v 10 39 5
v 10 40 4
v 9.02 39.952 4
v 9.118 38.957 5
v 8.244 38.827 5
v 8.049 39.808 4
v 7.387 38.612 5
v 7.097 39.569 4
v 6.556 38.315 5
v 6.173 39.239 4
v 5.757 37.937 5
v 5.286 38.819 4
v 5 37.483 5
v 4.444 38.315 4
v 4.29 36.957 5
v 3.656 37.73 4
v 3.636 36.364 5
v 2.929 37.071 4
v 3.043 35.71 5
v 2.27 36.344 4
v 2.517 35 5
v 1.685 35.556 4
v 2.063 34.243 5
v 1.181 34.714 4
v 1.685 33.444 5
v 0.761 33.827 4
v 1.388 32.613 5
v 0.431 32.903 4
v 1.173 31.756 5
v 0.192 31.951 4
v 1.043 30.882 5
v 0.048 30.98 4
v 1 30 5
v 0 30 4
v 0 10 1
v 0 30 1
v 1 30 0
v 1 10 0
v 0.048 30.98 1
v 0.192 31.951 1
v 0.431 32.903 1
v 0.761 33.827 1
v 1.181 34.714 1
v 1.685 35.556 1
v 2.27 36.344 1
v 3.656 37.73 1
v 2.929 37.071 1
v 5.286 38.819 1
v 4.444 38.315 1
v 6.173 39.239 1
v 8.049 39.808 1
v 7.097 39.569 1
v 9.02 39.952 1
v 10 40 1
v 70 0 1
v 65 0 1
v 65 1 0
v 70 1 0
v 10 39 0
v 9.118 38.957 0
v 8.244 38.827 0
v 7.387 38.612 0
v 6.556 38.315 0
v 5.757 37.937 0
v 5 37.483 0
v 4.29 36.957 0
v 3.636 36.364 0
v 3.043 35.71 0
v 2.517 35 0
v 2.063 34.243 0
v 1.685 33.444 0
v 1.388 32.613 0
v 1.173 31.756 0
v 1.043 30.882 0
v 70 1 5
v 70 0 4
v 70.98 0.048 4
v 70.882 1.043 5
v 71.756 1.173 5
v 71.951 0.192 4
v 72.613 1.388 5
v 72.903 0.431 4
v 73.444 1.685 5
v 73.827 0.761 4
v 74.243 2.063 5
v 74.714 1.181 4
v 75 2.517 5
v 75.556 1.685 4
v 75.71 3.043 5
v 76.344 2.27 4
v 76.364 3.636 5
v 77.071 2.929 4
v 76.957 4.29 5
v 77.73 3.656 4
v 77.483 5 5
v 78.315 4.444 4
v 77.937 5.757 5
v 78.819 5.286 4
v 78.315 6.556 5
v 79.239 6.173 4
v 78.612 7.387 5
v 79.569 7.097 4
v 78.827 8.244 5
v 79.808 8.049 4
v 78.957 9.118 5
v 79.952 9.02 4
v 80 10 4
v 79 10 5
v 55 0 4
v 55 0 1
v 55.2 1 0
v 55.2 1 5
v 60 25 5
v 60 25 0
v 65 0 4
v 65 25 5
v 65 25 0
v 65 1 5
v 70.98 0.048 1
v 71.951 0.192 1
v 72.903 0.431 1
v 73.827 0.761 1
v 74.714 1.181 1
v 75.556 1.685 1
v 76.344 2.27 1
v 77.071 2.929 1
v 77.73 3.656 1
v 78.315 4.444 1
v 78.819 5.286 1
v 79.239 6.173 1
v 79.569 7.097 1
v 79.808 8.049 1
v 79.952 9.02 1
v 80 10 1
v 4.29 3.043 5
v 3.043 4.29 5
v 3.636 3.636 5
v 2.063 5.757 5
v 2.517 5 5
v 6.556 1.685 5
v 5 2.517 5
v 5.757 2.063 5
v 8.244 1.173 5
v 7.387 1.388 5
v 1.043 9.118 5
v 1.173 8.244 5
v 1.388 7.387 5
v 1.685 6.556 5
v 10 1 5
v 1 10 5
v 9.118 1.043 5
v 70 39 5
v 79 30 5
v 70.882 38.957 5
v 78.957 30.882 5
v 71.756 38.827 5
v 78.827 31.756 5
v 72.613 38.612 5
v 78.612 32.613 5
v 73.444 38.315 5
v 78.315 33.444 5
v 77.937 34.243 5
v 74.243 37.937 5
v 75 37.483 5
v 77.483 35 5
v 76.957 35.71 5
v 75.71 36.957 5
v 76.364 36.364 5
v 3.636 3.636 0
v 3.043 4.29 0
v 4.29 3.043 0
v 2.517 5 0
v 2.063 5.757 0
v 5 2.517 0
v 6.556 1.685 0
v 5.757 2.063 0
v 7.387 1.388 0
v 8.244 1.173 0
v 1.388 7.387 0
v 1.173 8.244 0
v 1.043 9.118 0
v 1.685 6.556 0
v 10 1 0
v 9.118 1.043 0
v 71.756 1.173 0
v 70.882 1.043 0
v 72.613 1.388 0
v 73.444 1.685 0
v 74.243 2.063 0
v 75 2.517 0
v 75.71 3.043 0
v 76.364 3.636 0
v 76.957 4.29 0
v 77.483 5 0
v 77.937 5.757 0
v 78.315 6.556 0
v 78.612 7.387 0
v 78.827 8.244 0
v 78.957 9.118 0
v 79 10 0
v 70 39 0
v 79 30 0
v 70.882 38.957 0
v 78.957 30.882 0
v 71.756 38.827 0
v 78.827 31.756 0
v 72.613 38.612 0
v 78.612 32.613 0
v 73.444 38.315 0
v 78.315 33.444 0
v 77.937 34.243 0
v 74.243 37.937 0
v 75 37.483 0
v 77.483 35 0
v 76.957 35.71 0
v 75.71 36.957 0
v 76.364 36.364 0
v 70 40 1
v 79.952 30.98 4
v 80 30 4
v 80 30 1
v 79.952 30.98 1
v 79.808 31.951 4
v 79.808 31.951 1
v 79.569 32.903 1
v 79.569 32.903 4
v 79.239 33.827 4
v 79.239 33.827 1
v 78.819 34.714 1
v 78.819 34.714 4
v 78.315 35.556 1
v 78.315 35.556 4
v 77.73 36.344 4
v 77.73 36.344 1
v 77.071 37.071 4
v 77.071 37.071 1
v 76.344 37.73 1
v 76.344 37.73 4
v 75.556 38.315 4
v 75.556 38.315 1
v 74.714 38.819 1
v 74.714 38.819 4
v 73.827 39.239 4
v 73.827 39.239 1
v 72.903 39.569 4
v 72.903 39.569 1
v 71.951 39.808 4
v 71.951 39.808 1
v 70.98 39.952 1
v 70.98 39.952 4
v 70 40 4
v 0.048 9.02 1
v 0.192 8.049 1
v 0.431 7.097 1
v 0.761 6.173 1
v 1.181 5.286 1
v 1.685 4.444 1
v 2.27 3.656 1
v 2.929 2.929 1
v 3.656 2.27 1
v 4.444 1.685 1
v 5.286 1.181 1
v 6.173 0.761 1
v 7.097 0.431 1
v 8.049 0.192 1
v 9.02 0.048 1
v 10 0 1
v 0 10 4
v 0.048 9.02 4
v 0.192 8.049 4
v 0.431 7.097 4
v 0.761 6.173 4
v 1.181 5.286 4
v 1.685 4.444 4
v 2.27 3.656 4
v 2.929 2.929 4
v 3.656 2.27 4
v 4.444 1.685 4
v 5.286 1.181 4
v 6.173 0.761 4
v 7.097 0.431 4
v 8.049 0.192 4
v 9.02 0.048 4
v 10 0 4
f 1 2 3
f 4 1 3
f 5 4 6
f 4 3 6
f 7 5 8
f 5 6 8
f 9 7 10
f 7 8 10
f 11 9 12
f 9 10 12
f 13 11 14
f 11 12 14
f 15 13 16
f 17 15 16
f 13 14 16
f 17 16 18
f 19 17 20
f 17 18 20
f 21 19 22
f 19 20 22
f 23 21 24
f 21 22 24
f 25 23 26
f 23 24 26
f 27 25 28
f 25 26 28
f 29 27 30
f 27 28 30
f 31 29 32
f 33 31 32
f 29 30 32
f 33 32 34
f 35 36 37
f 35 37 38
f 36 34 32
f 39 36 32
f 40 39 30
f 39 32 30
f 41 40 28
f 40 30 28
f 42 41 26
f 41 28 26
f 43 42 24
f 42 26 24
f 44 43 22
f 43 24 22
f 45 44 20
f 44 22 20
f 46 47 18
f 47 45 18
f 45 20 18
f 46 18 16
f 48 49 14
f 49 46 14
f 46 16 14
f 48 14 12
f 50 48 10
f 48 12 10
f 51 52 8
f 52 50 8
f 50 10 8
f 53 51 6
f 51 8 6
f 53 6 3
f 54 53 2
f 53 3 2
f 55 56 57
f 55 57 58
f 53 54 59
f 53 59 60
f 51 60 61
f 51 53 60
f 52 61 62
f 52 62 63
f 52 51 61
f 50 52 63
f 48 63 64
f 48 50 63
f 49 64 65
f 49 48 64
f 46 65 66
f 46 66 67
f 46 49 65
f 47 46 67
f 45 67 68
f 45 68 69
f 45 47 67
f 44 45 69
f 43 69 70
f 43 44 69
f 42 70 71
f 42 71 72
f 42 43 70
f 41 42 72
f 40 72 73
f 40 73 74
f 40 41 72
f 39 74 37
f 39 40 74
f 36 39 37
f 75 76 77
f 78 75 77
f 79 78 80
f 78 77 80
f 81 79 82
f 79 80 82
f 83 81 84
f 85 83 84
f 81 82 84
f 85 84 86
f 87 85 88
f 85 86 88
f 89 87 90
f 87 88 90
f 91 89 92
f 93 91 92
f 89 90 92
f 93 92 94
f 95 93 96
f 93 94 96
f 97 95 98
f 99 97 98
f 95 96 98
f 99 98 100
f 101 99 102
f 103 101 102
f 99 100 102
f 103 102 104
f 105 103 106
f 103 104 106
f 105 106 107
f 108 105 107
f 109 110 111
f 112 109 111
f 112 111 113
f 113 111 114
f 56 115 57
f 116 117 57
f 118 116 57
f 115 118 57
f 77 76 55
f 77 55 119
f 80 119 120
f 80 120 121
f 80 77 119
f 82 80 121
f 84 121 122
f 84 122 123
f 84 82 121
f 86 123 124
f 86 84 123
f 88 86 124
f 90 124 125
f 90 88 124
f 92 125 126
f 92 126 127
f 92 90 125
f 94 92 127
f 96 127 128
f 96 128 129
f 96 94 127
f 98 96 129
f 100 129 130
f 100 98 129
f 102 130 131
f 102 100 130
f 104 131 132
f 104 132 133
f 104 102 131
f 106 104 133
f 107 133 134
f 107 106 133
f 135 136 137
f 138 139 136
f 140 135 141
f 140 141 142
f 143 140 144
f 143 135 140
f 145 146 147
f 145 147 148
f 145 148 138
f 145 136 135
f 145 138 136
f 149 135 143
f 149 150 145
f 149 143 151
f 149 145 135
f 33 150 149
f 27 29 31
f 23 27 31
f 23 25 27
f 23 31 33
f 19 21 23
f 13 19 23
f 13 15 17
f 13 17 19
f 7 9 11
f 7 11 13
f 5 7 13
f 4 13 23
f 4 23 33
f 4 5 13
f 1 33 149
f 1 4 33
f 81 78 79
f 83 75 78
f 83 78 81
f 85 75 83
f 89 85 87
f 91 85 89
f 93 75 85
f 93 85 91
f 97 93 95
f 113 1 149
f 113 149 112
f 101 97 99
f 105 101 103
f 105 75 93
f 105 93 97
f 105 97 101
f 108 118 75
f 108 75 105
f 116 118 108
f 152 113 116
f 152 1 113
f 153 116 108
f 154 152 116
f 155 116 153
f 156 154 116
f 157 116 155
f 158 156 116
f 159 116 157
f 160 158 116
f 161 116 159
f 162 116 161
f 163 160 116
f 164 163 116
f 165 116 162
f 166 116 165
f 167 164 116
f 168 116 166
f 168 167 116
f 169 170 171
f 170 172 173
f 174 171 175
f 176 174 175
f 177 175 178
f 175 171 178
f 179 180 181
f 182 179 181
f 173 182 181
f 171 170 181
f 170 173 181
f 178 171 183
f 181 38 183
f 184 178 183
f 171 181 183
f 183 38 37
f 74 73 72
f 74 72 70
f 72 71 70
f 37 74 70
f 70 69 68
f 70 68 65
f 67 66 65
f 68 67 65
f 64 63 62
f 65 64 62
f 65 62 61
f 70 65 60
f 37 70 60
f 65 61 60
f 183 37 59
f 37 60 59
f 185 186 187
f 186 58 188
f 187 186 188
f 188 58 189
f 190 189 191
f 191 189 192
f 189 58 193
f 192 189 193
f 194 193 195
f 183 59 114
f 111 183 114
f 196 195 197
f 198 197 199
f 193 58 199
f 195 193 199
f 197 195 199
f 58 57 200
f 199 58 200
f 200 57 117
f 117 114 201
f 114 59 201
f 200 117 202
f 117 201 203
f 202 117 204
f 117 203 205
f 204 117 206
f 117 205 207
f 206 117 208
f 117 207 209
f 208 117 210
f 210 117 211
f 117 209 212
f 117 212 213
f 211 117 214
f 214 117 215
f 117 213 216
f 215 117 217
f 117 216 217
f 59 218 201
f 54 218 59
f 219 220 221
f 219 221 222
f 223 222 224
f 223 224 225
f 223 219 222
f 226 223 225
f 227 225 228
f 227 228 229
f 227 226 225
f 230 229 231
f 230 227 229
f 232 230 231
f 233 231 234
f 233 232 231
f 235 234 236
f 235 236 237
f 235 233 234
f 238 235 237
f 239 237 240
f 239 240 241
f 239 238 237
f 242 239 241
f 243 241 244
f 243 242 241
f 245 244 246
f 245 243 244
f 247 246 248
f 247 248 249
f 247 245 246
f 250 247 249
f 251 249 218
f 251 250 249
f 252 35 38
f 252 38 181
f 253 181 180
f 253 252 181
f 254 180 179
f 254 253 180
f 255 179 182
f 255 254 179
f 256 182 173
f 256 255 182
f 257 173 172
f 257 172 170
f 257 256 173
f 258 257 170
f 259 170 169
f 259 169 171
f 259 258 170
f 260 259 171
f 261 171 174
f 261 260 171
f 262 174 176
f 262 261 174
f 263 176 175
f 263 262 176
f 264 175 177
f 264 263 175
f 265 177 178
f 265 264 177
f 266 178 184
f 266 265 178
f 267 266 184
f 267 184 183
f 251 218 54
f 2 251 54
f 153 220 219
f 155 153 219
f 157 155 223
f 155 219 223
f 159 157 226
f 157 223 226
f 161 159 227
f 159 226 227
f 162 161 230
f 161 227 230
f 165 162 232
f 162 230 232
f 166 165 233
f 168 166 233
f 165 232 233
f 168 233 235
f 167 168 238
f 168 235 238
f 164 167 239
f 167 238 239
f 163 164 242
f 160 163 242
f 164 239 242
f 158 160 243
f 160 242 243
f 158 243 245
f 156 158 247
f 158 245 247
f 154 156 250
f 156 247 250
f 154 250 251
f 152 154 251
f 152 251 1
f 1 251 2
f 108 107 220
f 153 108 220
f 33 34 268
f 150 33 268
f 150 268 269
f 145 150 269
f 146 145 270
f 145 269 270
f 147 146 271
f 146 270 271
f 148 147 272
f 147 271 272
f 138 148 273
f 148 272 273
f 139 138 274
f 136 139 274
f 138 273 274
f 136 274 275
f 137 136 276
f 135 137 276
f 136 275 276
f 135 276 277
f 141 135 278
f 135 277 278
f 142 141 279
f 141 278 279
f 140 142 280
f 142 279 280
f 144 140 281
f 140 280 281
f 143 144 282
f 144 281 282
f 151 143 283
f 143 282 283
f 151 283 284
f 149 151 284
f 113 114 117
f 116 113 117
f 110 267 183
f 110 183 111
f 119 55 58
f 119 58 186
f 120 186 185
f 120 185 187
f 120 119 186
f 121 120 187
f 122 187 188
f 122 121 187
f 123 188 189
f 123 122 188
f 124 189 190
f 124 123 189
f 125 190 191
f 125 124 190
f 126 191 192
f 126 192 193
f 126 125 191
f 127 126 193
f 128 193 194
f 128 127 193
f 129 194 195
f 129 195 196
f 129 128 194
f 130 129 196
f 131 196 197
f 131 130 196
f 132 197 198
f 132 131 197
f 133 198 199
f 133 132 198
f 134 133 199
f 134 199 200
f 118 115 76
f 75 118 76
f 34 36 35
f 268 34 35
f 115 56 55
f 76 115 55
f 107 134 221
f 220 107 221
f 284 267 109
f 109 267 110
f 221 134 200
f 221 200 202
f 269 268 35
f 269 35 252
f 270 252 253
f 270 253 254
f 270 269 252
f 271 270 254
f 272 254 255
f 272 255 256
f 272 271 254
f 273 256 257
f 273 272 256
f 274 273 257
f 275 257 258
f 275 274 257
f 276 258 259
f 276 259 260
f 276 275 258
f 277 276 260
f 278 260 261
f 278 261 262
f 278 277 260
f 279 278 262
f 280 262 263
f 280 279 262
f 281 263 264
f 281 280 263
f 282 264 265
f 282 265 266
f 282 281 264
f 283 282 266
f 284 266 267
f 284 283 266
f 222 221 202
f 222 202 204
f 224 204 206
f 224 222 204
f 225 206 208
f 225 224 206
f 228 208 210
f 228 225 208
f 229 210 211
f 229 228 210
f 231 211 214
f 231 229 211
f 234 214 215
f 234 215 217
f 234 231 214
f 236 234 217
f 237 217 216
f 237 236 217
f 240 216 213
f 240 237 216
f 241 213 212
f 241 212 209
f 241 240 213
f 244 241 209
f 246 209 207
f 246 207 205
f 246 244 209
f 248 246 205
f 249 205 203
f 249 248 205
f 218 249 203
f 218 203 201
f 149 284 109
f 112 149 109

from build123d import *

# Parameters (mm, degrees)
F1_DEPTH = 5
F2_R     = 10
F3_SIZE  = 1


with BuildPart() as f1:
    # F0 (on Top) → F1 (new body)
    with BuildSketch(Plane.XY):
        Polygon((0, 40), (0, 0), (55, 0), (60, 25), (65, 25), (65, 0), (80, 0), (80, 40), align=None)
    extrude(amount=F1_DEPTH)

    # F2
    f2_edges = [f1.edges().sort_by_distance(p)[0] for p in [
        (80, 0, 2.5),
        (80, 40, 2.5),
        (0, 40, 2.5),
        (0, 0, 2.5),
    ]]
    fillet(f2_edges, radius=F2_R)

    # F3
    f3_edges = [f1.edges().sort_by_distance(p)[0] for p in [
        (77.071068, 2.928932, 5),
        (77.071068, 2.928932, 0),
    ]]
    chamfer(f3_edges, length=F3_SIZE)


solid = f1.part
